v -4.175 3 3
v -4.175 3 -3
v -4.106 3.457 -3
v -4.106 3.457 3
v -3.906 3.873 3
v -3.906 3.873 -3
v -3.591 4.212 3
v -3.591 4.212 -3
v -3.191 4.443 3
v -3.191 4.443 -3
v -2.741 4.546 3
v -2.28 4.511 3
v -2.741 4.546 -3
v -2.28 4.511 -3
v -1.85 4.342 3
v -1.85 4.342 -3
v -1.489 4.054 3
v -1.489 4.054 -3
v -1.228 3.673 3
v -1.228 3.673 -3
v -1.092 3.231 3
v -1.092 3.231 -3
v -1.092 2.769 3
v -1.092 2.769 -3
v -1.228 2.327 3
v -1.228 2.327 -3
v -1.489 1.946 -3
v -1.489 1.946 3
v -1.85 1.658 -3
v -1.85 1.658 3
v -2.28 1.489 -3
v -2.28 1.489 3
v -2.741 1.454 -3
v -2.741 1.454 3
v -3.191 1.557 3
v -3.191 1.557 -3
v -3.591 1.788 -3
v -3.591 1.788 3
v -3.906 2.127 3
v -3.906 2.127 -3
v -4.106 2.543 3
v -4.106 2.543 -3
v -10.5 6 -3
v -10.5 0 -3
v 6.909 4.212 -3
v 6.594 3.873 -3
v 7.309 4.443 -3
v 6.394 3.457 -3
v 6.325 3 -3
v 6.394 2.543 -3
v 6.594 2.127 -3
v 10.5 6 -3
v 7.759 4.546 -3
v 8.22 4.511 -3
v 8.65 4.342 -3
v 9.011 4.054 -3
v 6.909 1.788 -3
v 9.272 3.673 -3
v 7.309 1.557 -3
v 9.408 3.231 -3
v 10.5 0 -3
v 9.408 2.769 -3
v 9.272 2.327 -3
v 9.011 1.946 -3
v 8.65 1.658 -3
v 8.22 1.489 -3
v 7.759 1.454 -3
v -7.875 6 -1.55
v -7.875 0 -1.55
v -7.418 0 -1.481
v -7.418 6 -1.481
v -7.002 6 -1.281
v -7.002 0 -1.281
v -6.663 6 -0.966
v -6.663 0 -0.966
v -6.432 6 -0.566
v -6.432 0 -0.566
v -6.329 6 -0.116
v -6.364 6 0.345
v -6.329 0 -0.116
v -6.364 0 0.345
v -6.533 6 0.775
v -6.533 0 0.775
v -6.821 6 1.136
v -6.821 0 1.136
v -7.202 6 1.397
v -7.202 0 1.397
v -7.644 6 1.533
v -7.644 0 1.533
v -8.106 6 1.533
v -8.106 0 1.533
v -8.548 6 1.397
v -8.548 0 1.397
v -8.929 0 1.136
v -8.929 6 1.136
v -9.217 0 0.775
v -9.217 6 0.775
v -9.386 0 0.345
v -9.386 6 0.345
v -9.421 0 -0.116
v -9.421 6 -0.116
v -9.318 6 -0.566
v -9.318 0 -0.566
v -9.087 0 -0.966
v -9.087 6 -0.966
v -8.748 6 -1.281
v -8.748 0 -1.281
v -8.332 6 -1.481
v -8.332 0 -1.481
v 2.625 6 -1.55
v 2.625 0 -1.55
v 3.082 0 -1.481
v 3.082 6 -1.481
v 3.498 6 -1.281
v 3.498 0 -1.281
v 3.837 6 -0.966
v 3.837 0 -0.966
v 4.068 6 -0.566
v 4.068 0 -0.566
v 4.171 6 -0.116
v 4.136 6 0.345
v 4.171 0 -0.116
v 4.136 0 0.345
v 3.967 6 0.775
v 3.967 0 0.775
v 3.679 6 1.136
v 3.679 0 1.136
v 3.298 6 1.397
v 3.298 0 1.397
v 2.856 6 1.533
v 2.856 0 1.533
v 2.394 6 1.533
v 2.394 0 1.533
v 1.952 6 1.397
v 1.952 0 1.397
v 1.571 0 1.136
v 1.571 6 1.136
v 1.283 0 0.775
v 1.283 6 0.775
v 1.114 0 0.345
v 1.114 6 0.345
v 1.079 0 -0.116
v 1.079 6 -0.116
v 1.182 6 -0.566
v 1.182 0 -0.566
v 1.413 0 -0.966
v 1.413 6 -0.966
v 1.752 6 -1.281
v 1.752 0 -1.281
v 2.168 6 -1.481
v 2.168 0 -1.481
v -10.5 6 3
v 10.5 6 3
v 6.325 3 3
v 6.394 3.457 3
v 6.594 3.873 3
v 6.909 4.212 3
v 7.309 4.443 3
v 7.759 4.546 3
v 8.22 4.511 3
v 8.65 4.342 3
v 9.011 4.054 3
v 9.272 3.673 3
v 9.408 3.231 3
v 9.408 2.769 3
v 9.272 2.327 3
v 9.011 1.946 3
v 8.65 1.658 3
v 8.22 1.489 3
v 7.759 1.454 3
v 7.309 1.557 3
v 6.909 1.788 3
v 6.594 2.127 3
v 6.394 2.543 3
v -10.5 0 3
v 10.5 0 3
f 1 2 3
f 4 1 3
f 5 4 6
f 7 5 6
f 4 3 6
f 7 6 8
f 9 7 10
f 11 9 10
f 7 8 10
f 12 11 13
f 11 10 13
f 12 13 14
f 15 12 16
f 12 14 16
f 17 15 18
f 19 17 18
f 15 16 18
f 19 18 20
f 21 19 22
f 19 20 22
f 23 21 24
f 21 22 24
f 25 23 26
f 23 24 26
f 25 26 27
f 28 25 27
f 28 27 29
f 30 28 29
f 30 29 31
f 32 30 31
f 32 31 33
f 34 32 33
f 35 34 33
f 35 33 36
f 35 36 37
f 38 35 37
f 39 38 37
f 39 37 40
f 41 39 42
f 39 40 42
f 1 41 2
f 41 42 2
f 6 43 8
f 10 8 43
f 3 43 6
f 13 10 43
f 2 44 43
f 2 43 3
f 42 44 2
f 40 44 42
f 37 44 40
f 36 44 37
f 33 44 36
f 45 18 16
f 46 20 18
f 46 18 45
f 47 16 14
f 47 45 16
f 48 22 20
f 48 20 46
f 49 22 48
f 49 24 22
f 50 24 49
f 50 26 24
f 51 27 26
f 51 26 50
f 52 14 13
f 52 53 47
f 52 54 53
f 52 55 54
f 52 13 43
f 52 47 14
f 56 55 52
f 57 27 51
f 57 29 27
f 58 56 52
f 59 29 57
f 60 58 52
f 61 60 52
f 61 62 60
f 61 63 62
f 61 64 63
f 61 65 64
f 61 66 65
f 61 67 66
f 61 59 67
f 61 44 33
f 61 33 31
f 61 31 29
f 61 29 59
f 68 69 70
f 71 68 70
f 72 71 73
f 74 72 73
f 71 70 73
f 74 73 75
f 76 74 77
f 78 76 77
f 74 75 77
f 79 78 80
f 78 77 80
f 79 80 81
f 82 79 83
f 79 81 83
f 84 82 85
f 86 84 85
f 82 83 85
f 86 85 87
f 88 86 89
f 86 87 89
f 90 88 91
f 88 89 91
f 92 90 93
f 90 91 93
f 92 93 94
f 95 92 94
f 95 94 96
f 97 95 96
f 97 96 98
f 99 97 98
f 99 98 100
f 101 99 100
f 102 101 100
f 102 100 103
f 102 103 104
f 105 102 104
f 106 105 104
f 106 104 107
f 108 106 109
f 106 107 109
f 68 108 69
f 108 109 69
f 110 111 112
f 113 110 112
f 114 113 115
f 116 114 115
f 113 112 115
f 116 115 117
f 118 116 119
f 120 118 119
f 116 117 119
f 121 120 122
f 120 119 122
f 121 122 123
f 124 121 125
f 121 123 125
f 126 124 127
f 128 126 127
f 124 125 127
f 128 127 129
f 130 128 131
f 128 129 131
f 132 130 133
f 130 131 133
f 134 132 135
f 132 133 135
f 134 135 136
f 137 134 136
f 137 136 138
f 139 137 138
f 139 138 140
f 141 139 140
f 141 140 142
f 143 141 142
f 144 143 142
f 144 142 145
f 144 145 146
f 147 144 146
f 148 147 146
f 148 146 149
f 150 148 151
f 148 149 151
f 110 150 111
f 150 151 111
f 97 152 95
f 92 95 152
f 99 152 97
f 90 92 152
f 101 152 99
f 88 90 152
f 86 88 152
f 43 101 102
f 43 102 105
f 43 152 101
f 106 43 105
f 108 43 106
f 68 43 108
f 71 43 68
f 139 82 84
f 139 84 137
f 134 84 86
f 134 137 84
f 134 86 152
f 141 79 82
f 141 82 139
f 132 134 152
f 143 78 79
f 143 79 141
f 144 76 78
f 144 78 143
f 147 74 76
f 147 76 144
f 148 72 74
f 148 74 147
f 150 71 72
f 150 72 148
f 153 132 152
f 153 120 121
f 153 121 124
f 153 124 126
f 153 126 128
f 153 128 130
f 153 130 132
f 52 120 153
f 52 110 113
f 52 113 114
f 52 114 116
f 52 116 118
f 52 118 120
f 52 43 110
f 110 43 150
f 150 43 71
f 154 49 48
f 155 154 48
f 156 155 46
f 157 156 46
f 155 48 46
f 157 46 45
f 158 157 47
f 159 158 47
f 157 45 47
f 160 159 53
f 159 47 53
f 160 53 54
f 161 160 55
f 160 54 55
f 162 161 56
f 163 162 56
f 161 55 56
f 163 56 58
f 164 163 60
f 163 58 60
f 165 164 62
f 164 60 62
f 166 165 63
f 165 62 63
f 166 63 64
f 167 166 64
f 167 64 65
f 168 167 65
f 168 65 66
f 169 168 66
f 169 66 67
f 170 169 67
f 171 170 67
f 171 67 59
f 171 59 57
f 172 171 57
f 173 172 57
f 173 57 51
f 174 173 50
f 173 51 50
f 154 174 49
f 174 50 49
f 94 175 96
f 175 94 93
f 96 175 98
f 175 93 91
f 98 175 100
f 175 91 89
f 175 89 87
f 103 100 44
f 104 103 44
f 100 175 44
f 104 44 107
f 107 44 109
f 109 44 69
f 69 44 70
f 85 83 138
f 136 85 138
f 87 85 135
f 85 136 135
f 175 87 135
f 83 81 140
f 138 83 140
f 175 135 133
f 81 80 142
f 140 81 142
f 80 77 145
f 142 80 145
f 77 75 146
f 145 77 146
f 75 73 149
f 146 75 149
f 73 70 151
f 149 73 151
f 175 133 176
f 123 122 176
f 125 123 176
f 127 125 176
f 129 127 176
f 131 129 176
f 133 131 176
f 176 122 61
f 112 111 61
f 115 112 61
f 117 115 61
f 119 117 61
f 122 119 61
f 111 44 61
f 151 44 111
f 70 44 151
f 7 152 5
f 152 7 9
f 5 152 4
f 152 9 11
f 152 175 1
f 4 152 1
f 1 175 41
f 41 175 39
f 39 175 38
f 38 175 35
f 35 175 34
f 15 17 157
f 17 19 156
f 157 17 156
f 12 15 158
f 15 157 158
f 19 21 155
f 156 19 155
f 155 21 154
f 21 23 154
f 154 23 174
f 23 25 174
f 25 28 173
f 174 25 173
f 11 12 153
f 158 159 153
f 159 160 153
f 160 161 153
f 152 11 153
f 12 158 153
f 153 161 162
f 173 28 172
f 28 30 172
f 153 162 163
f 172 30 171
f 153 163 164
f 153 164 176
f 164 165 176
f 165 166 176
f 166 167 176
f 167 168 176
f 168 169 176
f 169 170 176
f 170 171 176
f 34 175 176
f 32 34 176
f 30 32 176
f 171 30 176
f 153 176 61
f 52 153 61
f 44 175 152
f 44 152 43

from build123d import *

# Parameters (mm, degrees)
SKETCH_1_W          = 21
SKETCH_1_H          = 6
EXTRUDE_1_DEPTH     = 6
SKETCH_2_R          = 1.55
CUT_EXTRUDE_1_DEPTH = 6
SKETCH_3_R          = 1.55
CUT_EXTRUDE_2_DEPTH = 6


with BuildPart() as part:
    # 草图1 → 凸台-拉伸1 (new body)
    with BuildSketch(Plane(origin=(0, 0, 0), x_dir=(1, 0, 0), z_dir=(0, 1, 0))):
        Rectangle(SKETCH_1_W, SKETCH_1_H)
    extrude(amount=EXTRUDE_1_DEPTH)

    # 草图2 → 切除-拉伸1 (cut)
    with BuildSketch(Plane(origin=(0, 0, -3), x_dir=(-1, 0, 0), z_dir=(0, 0, -1))):
        with Locations((-7.875, 3)):
            Circle(SKETCH_2_R)
        with Locations((2.625, 3)):
            Circle(SKETCH_2_R)
    extrude(amount=-CUT_EXTRUDE_1_DEPTH, mode=Mode.SUBTRACT)

    # 草图3 → 切除-拉伸2 (cut)
    with BuildSketch(Plane.XZ):
        with Locations(Location((-7.875, 0, 0), (0, 0, 270))):
            Circle(SKETCH_3_R)
        with Locations(Location((2.625, 0, 0), (0, 0, 270))):
            Circle(SKETCH_3_R)
    extrude(amount=-CUT_EXTRUDE_2_DEPTH, mode=Mode.SUBTRACT)


solid = part.part
